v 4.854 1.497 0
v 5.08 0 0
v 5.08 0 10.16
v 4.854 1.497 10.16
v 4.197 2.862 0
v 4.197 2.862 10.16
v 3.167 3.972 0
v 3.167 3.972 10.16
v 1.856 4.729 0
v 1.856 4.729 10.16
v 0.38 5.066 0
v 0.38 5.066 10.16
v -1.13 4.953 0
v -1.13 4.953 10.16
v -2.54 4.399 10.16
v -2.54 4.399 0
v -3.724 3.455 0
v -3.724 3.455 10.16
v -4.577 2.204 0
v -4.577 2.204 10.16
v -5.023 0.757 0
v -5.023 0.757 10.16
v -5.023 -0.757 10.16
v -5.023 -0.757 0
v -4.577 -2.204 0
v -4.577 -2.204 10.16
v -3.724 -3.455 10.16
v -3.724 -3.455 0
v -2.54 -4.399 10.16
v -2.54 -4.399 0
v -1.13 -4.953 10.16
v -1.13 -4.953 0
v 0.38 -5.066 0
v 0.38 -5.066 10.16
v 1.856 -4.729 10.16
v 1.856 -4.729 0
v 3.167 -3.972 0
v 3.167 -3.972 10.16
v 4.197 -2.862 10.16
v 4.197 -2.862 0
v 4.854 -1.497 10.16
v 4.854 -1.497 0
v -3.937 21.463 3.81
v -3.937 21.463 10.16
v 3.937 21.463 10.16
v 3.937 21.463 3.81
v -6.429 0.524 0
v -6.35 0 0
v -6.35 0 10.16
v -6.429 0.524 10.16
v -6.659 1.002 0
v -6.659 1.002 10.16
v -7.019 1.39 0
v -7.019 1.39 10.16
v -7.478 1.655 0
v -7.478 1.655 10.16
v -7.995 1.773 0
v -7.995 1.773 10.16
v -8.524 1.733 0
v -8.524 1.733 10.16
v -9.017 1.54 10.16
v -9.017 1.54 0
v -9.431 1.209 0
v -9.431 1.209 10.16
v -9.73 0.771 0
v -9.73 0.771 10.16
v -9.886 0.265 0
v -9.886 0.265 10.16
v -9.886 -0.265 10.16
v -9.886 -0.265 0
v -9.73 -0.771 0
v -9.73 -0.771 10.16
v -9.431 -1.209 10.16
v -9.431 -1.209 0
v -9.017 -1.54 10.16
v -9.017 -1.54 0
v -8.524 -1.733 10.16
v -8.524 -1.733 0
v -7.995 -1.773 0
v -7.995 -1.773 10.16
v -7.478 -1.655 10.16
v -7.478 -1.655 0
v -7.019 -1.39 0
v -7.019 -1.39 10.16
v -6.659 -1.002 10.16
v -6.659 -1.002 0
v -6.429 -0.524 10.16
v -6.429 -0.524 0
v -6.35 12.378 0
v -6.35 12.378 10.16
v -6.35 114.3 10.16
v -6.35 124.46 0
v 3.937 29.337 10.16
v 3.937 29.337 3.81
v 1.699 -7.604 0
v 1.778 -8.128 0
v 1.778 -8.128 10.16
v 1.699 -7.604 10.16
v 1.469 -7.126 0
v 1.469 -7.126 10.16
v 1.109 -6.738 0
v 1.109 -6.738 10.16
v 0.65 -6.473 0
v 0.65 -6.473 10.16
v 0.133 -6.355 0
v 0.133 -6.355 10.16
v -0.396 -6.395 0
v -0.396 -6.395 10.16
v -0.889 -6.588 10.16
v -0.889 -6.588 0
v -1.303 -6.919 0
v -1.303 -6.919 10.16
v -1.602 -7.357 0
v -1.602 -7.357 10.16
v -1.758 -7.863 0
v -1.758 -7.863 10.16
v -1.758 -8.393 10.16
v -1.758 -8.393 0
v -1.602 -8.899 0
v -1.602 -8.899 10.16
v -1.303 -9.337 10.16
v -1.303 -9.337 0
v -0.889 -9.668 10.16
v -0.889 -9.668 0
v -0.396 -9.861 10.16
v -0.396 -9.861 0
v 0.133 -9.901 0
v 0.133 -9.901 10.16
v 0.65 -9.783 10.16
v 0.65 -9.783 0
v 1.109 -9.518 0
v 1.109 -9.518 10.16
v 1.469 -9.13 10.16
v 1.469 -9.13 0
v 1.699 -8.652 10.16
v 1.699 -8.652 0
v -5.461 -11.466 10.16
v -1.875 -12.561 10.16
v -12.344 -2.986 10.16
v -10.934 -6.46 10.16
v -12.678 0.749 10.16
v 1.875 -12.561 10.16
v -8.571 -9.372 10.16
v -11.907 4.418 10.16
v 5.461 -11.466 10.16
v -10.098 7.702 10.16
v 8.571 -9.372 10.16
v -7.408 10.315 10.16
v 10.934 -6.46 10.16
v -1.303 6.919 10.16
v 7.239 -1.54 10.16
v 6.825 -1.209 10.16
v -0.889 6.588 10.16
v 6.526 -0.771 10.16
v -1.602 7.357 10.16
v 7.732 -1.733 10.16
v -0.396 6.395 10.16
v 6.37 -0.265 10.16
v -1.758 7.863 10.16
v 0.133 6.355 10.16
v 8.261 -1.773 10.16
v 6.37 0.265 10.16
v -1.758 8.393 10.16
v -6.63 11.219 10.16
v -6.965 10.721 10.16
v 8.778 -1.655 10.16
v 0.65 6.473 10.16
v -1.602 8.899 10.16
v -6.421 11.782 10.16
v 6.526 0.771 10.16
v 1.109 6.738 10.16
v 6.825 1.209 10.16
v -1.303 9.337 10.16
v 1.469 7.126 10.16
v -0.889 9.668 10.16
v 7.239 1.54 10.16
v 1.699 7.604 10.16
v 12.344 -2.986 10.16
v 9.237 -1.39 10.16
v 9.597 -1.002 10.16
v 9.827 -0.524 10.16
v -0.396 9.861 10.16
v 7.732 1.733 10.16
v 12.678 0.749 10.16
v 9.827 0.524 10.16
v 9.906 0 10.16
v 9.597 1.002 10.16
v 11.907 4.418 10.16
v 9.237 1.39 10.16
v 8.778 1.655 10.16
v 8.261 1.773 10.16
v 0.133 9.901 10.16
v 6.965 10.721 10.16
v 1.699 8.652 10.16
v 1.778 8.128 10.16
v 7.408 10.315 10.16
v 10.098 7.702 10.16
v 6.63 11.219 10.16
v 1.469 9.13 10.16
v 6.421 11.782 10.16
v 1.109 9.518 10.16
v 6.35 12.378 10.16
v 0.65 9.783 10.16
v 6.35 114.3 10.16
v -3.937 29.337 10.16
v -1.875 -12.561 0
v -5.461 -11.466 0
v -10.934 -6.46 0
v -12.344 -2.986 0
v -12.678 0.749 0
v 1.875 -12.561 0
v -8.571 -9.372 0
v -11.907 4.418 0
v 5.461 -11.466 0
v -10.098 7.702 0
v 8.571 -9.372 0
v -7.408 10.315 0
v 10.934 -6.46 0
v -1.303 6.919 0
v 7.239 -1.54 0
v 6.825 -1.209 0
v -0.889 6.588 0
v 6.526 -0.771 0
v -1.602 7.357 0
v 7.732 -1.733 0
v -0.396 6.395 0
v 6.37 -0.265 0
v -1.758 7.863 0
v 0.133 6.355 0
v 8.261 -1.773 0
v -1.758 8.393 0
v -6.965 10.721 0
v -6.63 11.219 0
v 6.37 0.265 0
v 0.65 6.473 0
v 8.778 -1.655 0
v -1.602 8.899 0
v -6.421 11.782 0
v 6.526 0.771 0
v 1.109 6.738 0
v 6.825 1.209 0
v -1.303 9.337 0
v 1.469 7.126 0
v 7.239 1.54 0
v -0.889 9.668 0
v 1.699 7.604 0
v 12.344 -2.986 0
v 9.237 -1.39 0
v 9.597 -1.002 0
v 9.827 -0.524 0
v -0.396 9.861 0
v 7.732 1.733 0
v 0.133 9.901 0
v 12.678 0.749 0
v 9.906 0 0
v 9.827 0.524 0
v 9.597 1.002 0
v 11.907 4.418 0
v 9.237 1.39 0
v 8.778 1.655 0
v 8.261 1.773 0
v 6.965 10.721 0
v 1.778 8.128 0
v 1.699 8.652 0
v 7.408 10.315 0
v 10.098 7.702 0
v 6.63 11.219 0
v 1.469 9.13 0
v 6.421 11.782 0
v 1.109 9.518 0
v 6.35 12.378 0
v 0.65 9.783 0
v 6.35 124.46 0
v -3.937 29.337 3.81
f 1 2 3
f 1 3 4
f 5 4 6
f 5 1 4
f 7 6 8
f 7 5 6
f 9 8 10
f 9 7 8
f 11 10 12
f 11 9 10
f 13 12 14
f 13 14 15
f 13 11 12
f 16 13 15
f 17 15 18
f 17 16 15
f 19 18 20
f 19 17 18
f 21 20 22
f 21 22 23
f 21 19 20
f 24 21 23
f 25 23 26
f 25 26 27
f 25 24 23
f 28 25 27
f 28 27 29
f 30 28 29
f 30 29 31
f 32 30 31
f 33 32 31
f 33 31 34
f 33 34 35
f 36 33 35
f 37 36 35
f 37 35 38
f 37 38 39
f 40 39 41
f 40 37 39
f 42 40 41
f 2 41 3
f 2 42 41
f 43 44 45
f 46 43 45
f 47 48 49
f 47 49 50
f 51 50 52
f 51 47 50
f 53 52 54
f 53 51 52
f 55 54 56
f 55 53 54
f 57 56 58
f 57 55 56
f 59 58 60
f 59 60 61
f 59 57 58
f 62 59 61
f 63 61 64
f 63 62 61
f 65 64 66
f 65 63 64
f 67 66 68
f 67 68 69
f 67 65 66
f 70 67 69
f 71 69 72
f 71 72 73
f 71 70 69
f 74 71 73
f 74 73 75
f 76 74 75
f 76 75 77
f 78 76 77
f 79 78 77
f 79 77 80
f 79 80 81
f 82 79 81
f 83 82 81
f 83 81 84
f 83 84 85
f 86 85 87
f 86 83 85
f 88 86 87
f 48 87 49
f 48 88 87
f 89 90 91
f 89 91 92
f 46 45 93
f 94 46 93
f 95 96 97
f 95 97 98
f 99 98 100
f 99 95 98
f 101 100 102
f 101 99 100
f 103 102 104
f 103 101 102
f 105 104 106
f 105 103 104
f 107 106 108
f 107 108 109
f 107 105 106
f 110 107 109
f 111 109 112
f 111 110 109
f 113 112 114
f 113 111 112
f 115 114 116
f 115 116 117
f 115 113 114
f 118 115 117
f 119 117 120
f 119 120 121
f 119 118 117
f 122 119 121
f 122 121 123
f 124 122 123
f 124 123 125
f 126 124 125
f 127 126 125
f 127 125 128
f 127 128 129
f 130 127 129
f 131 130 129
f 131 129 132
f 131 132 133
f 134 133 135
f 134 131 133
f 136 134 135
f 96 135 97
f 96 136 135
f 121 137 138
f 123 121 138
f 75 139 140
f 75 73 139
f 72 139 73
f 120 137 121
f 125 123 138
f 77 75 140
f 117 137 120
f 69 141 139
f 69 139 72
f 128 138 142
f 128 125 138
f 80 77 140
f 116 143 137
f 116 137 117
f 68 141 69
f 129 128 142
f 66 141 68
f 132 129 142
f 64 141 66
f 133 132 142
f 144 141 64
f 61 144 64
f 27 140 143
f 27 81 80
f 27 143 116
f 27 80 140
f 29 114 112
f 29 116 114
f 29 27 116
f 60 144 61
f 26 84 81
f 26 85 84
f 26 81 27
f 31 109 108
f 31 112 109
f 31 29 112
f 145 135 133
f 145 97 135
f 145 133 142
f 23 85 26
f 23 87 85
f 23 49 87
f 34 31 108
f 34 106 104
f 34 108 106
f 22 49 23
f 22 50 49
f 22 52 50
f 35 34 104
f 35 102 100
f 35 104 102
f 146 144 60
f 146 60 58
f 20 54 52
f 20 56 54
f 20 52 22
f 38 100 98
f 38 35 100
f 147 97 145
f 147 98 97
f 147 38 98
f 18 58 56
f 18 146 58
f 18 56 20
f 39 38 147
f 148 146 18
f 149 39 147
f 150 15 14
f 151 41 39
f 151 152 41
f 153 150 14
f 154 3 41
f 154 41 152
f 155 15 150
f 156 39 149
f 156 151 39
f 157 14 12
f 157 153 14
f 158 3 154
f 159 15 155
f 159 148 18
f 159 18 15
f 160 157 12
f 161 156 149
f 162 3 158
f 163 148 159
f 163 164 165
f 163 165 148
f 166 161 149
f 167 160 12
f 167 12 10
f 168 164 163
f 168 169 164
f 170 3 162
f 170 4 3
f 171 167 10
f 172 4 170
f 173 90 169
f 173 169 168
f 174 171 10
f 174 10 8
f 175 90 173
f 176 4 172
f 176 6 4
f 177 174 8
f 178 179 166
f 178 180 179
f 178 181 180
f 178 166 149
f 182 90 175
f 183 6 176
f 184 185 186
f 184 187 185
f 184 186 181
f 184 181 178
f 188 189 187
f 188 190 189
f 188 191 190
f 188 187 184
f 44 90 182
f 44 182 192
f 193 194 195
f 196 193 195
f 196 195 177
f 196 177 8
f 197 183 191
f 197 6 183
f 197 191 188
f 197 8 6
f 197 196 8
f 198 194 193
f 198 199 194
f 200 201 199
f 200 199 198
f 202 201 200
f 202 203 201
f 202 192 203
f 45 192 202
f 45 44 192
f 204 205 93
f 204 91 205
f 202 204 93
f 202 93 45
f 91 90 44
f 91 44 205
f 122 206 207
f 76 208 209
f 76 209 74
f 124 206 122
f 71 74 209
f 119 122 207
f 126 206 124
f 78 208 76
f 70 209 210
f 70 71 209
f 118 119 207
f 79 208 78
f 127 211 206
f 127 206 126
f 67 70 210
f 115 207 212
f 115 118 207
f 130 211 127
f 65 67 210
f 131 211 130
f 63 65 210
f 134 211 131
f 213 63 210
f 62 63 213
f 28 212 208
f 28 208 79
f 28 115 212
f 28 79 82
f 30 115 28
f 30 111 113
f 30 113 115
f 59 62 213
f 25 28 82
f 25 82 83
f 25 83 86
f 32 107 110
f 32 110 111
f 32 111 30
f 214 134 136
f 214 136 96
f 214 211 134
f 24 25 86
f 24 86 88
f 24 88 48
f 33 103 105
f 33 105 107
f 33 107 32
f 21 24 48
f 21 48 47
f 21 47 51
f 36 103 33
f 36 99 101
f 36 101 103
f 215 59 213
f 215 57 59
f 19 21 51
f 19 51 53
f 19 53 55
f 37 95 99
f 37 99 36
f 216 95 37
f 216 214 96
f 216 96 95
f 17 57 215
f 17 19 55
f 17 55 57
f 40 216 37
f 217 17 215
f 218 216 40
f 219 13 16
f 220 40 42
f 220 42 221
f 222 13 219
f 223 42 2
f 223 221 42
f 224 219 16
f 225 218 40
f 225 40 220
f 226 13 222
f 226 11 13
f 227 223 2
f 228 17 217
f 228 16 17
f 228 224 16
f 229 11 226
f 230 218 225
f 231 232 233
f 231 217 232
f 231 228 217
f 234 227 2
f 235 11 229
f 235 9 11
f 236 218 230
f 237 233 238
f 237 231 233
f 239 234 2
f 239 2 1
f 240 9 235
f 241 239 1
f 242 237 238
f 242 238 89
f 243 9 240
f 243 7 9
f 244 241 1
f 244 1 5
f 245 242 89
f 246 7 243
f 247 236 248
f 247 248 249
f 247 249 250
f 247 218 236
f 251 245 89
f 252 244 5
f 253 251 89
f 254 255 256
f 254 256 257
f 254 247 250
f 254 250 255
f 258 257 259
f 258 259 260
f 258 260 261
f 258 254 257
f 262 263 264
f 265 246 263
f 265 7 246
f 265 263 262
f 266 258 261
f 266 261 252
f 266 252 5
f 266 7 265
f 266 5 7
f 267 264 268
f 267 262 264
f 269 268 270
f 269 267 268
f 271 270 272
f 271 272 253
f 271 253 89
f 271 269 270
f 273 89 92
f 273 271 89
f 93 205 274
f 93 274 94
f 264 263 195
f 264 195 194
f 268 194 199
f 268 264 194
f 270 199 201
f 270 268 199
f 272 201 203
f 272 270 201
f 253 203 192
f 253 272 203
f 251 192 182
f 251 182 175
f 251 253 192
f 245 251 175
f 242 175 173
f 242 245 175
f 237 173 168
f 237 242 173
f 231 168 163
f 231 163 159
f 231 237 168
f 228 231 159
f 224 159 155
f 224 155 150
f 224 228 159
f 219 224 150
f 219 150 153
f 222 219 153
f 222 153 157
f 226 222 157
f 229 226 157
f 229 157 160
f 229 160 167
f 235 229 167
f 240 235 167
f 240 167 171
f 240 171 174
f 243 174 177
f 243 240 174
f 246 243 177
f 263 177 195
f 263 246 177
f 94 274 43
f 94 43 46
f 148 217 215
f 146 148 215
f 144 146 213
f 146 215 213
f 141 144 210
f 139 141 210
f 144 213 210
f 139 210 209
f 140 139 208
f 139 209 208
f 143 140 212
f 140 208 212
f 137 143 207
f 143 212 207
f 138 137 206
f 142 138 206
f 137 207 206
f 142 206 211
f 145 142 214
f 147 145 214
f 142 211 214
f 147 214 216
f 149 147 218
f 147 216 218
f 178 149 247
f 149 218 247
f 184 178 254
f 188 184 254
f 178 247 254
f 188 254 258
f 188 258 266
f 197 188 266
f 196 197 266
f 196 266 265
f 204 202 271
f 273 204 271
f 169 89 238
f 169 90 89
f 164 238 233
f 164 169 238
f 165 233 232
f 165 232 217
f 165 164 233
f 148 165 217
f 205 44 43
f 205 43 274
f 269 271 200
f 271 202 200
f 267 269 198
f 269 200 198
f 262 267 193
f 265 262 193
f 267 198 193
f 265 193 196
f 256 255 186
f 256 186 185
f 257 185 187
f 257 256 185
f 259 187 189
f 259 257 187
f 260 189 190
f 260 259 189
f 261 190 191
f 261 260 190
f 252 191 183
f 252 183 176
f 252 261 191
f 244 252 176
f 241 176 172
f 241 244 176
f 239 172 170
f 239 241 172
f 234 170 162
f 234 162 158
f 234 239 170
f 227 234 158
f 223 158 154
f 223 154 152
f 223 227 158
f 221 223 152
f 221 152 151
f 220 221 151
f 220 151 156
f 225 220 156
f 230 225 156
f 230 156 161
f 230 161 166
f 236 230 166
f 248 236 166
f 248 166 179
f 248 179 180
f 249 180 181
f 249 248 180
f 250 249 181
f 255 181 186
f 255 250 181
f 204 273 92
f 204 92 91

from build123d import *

# Parameters (mm, degrees)
SKETCH1_R           = 5.08
SKETCH1_R_2         = 1.778
BOSS_EXTRUDE1_DEPTH = 10.16
BOSS_EXTRUDE3_DEPTH = 12.7
SKETCH3_W           = 7.874
SKETCH3_H           = 7.874
CUT_EXTRUDE1_DEPTH  = 6.35
FILLET1_R           = 2.54


with BuildPart() as part:
    # Sketch1 → Boss-Extrude1 (new body)
    with BuildSketch(Plane.XY):
        with BuildLine():
            Line((-6.35, 12.7), (-6.35, 10.998522628))
            ThreePointArc((-6.35, 10.998522628), (0, -12.7), (6.35, 10.998522628))
            Line((6.35, 10.998522628), (6.35, 12.7))
            Line((6.35, 12.7), (6.35, 114.3))
            Line((6.35, 114.3), (-6.35, 114.3))
            Line((-6.35, 114.3), (-6.35, 12.7))
        make_face()
        Circle(SKETCH1_R, mode=Mode.SUBTRACT)
        with Locations((0, 8.128)):
            Circle(SKETCH1_R_2, mode=Mode.SUBTRACT)
        with Locations((8.128, 0)):
            Circle(SKETCH1_R_2, mode=Mode.SUBTRACT)
        with Locations((0, -8.128)):
            Circle(SKETCH1_R_2, mode=Mode.SUBTRACT)
        with Locations((-8.128, 0)):
            Circle(SKETCH1_R_2, mode=Mode.SUBTRACT)
    extrude(amount=BOSS_EXTRUDE1_DEPTH)

    # Sketch2 → Boss-Extrude3 (add)
    with BuildSketch(Plane.ZY.offset(-6.35)):
        Polygon((0, 124.46), (10.16, 114.3), (0, 114.3), align=None)
    extrude(amount=BOSS_EXTRUDE3_DEPTH)

    # Sketch3 → Cut-Extrude1 (cut)
    with BuildSketch(Plane.XY.offset(10.16)):
        with Locations((0, 25.4)):
            Rectangle(SKETCH3_W, SKETCH3_H)
    extrude(amount=-CUT_EXTRUDE1_DEPTH, mode=Mode.SUBTRACT)

    # Fillet1
    fillet1_edges = [part.edges().sort_by_distance(p)[0] for p in [
        (6.35, 10.998522628, 5.08),
        (-6.35, 10.998522628, 5.08),
    ]]
    fillet(fillet1_edges, radius=FILLET1_R)


solid = part.part
